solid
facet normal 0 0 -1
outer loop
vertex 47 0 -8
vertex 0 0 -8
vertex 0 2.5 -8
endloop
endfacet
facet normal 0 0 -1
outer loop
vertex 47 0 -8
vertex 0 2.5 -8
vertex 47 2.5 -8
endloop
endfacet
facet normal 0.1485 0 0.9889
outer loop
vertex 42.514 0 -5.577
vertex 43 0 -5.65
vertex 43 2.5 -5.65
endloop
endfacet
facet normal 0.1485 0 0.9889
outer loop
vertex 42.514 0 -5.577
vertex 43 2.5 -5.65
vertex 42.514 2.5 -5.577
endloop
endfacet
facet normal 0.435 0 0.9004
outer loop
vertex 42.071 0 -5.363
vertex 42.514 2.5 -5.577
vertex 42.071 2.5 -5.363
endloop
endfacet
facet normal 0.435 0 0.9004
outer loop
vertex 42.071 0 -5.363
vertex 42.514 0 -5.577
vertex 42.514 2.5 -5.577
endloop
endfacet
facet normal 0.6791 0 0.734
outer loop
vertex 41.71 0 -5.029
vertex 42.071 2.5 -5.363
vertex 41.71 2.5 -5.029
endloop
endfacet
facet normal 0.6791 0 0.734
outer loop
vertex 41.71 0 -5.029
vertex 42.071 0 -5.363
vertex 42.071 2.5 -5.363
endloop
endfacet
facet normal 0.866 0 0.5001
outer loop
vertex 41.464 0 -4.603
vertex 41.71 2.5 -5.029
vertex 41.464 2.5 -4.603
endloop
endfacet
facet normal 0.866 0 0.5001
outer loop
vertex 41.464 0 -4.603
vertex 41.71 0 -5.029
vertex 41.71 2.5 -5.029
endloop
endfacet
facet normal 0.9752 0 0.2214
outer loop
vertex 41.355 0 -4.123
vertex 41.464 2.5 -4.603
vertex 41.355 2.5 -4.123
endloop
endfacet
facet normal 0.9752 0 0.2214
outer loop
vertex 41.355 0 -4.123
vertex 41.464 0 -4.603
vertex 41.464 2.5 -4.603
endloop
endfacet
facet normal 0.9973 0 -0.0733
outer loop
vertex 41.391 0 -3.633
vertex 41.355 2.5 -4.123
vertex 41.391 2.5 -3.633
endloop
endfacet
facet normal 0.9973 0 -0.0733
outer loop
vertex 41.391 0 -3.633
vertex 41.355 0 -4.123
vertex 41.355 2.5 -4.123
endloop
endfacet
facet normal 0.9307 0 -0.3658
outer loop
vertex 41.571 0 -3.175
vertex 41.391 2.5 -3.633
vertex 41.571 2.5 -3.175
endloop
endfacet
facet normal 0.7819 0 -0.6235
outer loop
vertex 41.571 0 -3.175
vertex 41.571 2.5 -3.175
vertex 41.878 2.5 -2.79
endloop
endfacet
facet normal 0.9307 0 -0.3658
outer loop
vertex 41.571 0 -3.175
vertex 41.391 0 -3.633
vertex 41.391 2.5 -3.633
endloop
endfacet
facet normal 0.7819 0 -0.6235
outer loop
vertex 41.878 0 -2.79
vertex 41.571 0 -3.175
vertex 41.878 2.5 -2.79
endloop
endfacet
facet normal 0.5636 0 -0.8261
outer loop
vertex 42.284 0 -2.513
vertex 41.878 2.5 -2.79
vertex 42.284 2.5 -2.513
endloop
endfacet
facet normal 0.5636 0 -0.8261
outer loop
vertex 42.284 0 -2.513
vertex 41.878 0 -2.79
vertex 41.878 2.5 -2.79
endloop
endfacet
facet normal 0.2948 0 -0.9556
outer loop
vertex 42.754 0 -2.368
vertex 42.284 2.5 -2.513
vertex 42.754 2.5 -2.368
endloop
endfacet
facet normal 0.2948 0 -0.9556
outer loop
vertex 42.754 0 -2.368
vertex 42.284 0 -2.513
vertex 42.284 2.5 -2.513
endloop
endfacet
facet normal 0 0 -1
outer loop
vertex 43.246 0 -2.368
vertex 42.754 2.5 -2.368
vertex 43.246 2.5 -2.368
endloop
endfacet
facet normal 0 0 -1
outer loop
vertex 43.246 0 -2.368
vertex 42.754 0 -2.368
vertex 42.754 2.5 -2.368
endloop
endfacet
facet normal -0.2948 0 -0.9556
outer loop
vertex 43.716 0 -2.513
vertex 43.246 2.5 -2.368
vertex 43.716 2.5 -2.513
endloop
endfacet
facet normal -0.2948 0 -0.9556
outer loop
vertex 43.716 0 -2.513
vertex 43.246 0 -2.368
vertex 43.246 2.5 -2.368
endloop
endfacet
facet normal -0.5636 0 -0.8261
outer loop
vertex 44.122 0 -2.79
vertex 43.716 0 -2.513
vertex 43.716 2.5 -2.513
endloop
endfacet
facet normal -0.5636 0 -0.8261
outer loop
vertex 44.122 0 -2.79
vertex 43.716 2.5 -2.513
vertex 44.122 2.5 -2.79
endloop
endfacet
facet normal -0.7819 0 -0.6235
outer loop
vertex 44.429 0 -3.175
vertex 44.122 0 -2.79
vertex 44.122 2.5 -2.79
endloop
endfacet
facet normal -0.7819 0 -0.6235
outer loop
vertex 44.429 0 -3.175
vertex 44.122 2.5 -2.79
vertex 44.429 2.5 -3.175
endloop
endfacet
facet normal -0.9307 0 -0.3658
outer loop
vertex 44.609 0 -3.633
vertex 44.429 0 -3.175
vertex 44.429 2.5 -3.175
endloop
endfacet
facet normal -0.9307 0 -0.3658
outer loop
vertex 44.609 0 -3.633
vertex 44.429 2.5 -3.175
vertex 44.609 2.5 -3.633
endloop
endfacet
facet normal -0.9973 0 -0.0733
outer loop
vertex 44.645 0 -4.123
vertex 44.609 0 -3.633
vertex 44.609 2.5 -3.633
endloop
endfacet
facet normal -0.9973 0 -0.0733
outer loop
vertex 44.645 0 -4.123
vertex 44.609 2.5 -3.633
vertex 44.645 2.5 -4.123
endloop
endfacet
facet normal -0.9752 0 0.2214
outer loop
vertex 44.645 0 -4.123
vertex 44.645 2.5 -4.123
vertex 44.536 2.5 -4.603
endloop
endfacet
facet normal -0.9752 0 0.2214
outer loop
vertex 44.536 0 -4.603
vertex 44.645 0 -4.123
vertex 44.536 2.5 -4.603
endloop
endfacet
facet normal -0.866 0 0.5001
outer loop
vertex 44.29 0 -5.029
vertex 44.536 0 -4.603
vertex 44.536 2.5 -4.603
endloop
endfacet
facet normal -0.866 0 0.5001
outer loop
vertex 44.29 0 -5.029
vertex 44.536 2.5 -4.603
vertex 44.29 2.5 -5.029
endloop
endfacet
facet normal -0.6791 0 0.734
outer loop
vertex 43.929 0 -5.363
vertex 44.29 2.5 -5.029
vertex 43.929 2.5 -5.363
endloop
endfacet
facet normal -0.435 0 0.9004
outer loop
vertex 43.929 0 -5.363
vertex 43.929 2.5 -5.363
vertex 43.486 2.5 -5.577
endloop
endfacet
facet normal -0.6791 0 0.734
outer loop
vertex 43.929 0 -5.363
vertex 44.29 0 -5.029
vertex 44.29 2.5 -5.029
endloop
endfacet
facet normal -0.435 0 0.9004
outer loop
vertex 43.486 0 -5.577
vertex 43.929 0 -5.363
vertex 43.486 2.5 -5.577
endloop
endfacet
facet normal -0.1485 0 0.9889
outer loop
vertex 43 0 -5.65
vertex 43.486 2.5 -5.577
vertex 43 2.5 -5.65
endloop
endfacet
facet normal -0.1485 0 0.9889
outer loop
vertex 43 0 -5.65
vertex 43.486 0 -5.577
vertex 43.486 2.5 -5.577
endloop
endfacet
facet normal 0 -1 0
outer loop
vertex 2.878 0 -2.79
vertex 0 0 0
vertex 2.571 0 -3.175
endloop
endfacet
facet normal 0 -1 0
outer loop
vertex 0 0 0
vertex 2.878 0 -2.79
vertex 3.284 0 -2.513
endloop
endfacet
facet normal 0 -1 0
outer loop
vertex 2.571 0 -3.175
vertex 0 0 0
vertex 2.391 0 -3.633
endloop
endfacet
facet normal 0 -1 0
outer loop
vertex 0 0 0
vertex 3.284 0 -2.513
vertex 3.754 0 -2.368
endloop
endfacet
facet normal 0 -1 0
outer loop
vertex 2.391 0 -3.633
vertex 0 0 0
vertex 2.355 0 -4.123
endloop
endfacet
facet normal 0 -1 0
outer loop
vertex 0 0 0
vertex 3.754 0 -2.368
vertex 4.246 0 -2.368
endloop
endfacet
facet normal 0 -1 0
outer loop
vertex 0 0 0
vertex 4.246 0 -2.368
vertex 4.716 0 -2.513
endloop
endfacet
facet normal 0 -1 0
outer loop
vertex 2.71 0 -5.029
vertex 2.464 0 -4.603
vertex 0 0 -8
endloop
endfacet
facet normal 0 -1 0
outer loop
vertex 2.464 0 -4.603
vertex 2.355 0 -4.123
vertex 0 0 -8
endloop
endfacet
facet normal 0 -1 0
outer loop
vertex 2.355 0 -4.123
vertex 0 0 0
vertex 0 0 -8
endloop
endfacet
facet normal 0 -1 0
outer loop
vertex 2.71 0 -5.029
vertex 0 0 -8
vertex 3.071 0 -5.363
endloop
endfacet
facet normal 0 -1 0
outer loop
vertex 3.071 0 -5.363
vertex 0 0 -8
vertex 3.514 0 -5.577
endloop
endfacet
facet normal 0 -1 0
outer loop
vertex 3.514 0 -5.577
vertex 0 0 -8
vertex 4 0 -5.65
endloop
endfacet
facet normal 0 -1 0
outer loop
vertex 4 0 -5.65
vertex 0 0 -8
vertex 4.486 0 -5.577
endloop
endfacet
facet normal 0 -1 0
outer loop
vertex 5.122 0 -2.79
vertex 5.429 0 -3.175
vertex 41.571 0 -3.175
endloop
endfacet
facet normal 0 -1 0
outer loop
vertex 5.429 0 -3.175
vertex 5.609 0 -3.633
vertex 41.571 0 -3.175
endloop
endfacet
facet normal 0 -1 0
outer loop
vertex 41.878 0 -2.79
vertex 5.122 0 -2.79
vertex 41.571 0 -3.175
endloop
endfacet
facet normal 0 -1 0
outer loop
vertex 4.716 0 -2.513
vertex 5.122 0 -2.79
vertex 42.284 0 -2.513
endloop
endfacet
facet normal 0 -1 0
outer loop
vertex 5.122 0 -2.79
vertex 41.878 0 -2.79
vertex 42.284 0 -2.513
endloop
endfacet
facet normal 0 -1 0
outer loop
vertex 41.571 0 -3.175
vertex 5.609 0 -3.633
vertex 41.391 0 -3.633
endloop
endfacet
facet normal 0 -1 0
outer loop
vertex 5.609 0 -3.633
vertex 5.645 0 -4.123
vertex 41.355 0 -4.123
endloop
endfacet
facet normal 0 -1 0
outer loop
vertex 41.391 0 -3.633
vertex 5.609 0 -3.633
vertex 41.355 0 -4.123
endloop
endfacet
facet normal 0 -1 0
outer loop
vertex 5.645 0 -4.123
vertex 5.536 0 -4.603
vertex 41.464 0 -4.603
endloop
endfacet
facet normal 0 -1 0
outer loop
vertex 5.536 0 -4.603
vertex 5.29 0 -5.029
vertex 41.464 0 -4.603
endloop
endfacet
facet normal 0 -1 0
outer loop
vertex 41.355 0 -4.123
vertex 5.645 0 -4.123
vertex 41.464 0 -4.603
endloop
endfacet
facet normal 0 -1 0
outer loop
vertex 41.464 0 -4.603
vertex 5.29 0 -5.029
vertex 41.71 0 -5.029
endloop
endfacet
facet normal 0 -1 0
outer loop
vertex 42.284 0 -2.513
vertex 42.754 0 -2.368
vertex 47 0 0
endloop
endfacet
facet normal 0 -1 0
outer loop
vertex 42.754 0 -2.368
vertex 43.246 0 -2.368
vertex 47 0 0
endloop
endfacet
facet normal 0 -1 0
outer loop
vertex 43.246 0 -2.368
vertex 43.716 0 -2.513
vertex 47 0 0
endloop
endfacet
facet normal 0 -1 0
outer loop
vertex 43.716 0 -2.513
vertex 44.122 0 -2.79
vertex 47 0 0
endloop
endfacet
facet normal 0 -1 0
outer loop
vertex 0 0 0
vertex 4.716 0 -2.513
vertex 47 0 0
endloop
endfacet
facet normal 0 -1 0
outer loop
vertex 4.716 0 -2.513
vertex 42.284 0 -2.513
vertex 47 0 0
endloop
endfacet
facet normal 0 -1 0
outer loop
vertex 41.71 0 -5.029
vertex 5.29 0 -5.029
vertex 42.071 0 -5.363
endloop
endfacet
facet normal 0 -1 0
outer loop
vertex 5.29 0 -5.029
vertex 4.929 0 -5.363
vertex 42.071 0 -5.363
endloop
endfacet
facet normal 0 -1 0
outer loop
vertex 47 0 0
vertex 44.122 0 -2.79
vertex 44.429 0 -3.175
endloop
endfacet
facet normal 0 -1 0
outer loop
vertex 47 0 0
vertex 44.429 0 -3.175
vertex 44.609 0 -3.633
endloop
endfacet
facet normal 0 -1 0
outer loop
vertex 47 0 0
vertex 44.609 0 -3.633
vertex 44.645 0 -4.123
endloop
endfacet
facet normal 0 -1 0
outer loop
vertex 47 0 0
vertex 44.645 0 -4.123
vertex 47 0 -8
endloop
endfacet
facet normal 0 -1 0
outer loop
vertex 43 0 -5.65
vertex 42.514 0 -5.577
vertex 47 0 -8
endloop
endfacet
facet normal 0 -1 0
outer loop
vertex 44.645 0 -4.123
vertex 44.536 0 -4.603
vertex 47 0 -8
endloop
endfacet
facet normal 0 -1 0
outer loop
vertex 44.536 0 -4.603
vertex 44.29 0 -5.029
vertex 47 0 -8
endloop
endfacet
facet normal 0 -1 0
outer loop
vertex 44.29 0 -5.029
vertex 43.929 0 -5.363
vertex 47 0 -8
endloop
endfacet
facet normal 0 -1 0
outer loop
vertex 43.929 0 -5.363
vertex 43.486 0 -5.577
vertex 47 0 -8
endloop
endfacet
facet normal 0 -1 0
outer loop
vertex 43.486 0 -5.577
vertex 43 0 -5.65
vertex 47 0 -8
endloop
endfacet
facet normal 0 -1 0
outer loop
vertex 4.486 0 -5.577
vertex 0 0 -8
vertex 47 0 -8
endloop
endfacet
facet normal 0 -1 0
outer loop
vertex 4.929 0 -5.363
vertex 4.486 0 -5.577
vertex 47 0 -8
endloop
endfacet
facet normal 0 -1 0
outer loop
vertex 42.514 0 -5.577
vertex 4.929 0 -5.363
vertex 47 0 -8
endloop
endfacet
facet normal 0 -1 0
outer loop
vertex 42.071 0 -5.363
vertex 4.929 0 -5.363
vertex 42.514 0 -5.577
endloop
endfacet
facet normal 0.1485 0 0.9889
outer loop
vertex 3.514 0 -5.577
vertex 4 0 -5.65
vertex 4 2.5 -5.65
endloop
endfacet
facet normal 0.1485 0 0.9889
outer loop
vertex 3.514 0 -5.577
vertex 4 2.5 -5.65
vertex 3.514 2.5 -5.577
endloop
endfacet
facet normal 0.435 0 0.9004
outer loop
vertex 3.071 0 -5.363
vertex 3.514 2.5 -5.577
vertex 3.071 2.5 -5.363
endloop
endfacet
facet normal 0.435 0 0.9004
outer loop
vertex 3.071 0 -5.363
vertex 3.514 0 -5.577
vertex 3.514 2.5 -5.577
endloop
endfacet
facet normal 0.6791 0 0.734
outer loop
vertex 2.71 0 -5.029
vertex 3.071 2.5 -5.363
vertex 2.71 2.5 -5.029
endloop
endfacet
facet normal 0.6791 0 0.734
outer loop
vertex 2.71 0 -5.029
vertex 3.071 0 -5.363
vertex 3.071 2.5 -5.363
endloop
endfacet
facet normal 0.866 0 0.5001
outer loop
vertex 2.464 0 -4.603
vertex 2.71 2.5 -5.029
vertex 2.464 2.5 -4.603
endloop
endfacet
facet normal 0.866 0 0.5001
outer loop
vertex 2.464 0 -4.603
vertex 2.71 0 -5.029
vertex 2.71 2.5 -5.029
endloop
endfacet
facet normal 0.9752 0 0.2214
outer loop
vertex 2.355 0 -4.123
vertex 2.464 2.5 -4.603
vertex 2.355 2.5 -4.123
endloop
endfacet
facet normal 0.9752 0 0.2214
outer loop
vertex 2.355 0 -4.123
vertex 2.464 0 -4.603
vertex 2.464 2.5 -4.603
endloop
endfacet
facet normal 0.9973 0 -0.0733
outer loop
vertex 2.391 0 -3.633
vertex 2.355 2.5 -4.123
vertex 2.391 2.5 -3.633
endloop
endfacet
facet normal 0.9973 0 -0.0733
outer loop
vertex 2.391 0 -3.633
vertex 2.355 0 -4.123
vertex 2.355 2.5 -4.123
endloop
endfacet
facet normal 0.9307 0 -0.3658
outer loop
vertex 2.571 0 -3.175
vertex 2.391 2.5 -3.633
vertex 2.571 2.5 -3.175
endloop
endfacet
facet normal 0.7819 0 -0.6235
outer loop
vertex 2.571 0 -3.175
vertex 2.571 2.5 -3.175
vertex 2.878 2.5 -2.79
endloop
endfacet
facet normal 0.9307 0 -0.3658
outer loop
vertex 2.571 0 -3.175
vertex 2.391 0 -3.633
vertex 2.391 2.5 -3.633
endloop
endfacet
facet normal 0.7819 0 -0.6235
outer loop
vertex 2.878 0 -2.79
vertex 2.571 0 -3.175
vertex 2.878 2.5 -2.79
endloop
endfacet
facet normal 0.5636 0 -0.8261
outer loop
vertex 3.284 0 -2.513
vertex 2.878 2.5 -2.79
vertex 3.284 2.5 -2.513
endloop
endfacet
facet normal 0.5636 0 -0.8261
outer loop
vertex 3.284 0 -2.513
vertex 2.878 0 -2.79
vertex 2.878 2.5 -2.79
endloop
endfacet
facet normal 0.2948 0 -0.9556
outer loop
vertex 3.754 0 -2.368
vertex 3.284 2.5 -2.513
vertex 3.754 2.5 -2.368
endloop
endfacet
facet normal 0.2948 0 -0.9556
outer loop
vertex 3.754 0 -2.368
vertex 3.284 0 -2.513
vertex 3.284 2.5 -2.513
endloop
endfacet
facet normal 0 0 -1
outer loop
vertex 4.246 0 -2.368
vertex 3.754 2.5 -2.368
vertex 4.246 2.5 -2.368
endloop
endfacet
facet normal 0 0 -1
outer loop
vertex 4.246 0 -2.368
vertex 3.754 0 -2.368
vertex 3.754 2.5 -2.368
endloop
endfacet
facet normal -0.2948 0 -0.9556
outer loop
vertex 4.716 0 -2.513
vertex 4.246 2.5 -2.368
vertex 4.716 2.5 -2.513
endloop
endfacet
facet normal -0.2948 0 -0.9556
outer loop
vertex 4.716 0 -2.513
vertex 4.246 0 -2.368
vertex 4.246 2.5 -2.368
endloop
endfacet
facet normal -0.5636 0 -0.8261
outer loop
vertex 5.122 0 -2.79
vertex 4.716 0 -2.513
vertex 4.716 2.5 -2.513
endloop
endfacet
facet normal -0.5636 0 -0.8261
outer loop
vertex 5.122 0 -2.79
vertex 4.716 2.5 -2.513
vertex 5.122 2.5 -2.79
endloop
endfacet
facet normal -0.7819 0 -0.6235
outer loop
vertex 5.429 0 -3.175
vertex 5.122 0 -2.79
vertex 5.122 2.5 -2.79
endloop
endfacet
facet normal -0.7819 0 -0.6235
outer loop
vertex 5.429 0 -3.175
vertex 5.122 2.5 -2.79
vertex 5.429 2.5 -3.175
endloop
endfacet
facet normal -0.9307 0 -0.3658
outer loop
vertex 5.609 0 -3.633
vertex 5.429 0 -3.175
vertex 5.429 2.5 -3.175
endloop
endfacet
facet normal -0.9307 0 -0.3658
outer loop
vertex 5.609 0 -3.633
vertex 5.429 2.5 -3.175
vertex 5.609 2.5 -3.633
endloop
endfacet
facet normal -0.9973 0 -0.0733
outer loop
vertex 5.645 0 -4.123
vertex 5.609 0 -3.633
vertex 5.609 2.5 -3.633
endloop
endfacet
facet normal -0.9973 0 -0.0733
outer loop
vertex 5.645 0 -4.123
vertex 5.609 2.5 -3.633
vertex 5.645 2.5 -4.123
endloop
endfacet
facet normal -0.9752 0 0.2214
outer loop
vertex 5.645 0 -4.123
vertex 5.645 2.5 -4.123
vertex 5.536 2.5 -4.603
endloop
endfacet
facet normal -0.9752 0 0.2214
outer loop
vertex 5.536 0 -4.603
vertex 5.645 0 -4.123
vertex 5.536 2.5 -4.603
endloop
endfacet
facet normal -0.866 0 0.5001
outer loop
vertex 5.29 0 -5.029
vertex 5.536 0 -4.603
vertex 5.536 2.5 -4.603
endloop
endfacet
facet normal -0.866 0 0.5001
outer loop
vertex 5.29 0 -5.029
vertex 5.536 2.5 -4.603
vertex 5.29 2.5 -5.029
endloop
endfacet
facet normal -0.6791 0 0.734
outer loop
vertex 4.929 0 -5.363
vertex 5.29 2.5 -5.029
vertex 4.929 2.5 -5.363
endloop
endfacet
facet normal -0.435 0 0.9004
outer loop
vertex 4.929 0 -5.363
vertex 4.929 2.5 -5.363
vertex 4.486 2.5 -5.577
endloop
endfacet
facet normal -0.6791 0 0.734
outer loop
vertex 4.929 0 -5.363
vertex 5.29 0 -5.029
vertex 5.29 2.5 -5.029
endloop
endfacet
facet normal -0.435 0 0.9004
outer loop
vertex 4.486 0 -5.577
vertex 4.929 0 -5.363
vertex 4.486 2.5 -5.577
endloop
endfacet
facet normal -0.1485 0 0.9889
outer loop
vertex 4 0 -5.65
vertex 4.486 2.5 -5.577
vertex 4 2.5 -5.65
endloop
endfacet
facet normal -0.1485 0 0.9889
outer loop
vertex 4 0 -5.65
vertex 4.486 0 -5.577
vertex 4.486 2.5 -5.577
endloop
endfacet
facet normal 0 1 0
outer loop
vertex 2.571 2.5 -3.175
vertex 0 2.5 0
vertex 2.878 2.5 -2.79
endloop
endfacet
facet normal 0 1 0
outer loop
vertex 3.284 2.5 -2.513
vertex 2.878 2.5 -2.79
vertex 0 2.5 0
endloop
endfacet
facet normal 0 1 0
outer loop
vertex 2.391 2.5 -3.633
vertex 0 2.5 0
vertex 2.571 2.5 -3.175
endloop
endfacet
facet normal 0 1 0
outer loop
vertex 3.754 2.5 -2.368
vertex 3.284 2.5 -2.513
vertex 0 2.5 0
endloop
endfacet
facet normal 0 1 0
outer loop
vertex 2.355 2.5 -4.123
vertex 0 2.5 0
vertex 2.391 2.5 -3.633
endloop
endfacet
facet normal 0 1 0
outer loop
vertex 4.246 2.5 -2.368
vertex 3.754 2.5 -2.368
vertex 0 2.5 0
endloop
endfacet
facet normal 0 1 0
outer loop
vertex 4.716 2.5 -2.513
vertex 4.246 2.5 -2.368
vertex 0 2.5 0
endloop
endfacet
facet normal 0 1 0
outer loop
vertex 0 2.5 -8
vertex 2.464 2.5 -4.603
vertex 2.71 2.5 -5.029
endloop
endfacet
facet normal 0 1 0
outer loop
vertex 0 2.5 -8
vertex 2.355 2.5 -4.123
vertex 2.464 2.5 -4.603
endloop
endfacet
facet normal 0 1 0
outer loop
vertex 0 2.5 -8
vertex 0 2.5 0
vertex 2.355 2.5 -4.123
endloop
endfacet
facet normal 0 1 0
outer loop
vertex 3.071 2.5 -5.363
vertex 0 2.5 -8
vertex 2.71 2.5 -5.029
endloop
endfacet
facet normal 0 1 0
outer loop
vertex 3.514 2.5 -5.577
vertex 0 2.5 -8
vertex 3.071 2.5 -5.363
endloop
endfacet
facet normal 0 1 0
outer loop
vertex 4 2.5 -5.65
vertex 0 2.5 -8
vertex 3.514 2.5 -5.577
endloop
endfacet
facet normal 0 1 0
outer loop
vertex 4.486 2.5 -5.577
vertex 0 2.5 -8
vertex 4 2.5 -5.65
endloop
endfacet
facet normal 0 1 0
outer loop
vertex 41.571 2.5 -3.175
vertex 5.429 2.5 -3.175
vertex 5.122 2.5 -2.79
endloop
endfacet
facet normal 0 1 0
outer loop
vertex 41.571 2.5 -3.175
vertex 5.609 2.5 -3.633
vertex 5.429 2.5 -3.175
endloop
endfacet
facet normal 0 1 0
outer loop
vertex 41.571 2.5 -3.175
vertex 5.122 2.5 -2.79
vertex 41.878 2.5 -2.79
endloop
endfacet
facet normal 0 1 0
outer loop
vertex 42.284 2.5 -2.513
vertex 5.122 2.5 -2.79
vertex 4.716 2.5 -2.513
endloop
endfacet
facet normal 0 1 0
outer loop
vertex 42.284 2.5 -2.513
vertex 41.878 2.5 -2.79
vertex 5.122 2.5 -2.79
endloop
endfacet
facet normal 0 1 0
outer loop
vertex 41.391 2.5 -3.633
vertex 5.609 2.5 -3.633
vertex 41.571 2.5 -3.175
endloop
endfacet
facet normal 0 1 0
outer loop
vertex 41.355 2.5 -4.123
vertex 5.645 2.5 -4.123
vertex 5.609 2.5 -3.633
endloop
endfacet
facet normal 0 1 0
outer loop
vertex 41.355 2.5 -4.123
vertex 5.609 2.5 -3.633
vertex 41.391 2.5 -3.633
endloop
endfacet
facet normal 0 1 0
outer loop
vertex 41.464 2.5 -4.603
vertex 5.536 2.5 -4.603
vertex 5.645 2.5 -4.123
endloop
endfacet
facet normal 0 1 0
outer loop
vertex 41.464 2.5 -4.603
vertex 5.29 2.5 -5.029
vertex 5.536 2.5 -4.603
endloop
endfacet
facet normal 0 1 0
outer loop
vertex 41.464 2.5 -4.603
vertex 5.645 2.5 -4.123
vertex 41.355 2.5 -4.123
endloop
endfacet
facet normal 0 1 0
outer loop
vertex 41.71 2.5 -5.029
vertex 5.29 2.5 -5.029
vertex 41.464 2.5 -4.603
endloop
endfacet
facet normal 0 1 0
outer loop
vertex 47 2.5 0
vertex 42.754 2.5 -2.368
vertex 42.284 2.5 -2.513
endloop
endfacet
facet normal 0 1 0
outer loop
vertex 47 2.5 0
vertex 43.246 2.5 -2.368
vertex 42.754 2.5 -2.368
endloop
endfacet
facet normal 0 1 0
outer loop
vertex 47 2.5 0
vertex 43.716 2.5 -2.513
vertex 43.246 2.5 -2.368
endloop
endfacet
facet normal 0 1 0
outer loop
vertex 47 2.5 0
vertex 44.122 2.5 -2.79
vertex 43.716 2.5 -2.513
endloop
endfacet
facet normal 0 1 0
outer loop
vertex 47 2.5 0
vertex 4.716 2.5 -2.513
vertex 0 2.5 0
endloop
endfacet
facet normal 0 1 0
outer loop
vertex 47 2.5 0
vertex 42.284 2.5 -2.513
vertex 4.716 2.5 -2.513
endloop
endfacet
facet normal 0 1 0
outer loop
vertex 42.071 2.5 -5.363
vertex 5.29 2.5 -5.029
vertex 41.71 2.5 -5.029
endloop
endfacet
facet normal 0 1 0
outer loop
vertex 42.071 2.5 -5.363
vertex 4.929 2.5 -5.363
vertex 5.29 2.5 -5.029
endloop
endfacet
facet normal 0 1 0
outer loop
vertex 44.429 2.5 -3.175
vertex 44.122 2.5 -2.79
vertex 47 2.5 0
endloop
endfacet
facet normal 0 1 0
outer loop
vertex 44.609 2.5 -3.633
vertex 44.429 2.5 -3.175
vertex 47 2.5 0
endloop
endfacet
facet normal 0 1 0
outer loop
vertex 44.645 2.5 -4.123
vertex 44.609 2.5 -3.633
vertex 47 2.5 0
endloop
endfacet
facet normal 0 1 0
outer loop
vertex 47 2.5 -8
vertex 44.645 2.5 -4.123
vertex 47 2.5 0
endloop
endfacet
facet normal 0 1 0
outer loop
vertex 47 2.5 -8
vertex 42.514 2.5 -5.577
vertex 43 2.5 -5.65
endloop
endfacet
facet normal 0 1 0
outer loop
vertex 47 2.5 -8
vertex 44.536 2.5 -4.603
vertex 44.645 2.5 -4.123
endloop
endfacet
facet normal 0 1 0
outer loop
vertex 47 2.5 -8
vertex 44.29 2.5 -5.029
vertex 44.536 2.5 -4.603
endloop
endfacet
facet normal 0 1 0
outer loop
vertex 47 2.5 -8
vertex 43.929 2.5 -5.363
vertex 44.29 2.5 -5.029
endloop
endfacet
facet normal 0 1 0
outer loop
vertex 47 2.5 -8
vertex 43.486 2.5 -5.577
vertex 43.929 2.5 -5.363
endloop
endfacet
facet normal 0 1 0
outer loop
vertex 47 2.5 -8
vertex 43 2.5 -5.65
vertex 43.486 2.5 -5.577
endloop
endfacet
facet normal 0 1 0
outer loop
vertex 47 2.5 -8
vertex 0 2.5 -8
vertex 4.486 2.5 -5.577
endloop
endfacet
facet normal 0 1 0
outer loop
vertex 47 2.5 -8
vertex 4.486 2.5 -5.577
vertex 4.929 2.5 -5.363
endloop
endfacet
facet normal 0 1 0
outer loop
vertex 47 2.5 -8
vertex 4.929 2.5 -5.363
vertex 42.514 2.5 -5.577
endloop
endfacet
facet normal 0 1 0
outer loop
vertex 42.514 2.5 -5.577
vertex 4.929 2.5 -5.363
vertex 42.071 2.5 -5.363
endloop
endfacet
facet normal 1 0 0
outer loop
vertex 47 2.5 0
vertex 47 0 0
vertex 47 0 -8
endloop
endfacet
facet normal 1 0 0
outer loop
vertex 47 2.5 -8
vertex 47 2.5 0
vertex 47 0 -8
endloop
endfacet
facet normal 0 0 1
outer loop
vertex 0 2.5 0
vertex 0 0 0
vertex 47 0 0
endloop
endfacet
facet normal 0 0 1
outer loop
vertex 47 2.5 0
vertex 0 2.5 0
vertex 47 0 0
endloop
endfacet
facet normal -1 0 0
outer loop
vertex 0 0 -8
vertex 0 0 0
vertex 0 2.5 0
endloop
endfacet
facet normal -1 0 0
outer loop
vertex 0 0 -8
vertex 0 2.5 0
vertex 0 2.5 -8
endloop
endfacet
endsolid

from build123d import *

# Parameters (mm, degrees)
SKETCH1_W           = 47
SKETCH1_H           = 8
BOSS_EXTRUDE1_DEPTH = 2.5
SKETCH2_R           = 1.65
CUT_EXTRUDE1_DEPTH  = 2.5


with BuildPart() as part:
    # Sketch1 → Boss-Extrude1 (new body)
    with BuildSketch(Plane(origin=(0, 0, 0), x_dir=(1, 0, 0), z_dir=(0, 1, 0))):
        with Locations((23.5, 4)):
            Rectangle(SKETCH1_W, SKETCH1_H)
    extrude(amount=BOSS_EXTRUDE1_DEPTH)

    # Sketch2 → Cut-Extrude1 (cut)
    with BuildSketch(Plane(origin=(0, 0, 0), x_dir=(1, 0, 0), z_dir=(0, 1, 0))):
        with Locations(Location((4, 4, 0), (0, 0, 90))):
            Circle(SKETCH2_R)
        with Locations(Location((43, 4, 0), (0, 0, 90))):
            Circle(SKETCH2_R)
    extrude(amount=CUT_EXTRUDE1_DEPTH, mode=Mode.SUBTRACT)


solid = part.part
